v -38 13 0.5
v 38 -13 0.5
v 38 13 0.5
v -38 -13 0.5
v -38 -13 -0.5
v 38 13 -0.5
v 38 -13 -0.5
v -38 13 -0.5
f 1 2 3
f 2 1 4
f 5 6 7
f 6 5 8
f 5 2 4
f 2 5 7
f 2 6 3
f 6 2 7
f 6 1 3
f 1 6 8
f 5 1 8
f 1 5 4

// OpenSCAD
// ----------------------------------------------------
// Fit and scale compensation (explicit geometry inputs)
// ----------------------------------------------------
// scale_comp_x/y/z: unitless scale factors applied to the slide body
// (1.0 = none). Manifest parameters of microscope-slide-hyperobject.
scale_comp_x = 1.0;
scale_comp_y = 1.0;
scale_comp_z = 1.0;
// fit_clearance_slide: extra slot clearance in mm that slide_slot_width()
// adds for a sliding fit (0 = none). A library input: microscope-slide-holder
// declares it; microscope-slide-hyperobject renders no slot, so it does not.
fit_clearance_slide = 0.0;

// LEGACY material injection. REMOVE AT THE FLIP of the yantra4d flag
// RENDER_MATERIAL_INJECTION (owner ruling "flag now, flip later").
// While that flag is on, a render request naming target_material makes the
// platform pass the material card's mat_shrinkage_x/y/z and mat_clear_slide
// with -D. They are undef unless injected, and an injected value WINS over
// the explicit parameter above, so a render with the flag on is unchanged.
// At the flip, delete these four assignments and _legacy_or() and read the
// explicit parameters directly. mat_clear_press and mat_clear_loose were
// declared here but never read, so they are no longer declared.
mat_shrinkage_x = undef;
mat_shrinkage_y = undef;
mat_shrinkage_z = undef;
mat_clear_slide = undef;
function _legacy_or(legacy, explicit) = is_undef(legacy) ? explicit : legacy;

// Standard Microscope Slide Dimensions (ISO 8037)
function slide_slot_width(thickness, tolerance) =
  thickness + tolerance + _legacy_or(mat_clear_slide, fit_clearance_slide) + 0.1;
function slide_pitch(slot_w, rib_w) = slot_w + rib_w;

module slide_retention_rib(height, depth, root_w, tip_w, chamfer_h) {
  union() {
    cube([root_w, depth, height - chamfer_h]);
    translate([0, 0, height - chamfer_h])
      polyhedron(
        points=[
          [0, 0, 0],
          [root_w, 0, 0],
          [root_w, depth, 0],
          [0, depth, 0],
          [(root_w - tip_w) / 2, 0, chamfer_h],
          [(root_w + tip_w) / 2, 0, chamfer_h],
          [(root_w + tip_w) / 2, depth, chamfer_h],
          [(root_w - tip_w) / 2, depth, chamfer_h],
        ],
        faces=[
          [0, 1, 2, 3],
          [4, 5, 6, 7],
          [0, 4, 7, 3],
          [1, 5, 6, 2],
          [0, 1, 5, 4],
          [3, 2, 6, 7],
        ]
      );
  }
}

module slide_slot_array(count, pitch, height, depth, root_w, tip_w, chamfer_h, tapered) {
  for (i = [0:count]) {
    translate([i * pitch, 0, 0])
      slide_retention_rib(height, depth, root_w, tip_w, chamfer_h);
  }
}

// ----------------------------------------------------
// ISO 8037-1 Bounded 4D Geometry
// ----------------------------------------------------

module iso_8037_slide(length, width, thickness) {
  // A standard microscope slide volumetric cartridge.
  // Glass usually has polished or ground edges.
  cube([length, width, thickness], center=true);
}

// ----------------------------------------------------
// Cartridge Execution Logic (Triggered by Manifest)
// ----------------------------------------------------

slide_standard = 0; // [0:ISO 8037-1 Primary, 1:ISO 8037-1 Alternate, 2:ISO 8255 #1.5H Cover, 3:ISO 8255 #1 Cover, 4:Custom]
custom_slide_length = 76.0;
custom_slide_width = 26.0;
custom_slide_thickness = 1.0;

render_mode = 0; // [0:main]

if (render_mode == 0) {
  // Material simulation logic for transparency via OpenSCAD nightly alpha
  color([0.8, 0.9, 0.9, 0.4]) {
    // Scale compensation: the explicit scale_comp_* parameters, or the legacy
    // injected mat_shrinkage_* while the platform still injects them.
    scale([_legacy_or(mat_shrinkage_x, scale_comp_x),
           _legacy_or(mat_shrinkage_y, scale_comp_y),
           _legacy_or(mat_shrinkage_z, scale_comp_z)]) {
      if (slide_standard == 0) {
        // ISO 8037-1 Primary
        iso_8037_slide(76.0, 26.0, 1.0);
      } else if (slide_standard == 1) {
        // ISO 8037-1 Alternate
        iso_8037_slide(75.0, 25.0, 1.0);
      } else if (slide_standard == 2) {
        // ISO 8255 #1.5H Cover Glass
        iso_8037_slide(22.0, 22.0, 0.17);
      } else if (slide_standard == 3) {
        // ISO 8255 #1 Cover Glass
        iso_8037_slide(22.0, 22.0, 0.15);
      } else if (slide_standard == 4) {
        // Custom Geometry
        iso_8037_slide(custom_slide_length, custom_slide_width, custom_slide_thickness);
      }
    }
  }
}
